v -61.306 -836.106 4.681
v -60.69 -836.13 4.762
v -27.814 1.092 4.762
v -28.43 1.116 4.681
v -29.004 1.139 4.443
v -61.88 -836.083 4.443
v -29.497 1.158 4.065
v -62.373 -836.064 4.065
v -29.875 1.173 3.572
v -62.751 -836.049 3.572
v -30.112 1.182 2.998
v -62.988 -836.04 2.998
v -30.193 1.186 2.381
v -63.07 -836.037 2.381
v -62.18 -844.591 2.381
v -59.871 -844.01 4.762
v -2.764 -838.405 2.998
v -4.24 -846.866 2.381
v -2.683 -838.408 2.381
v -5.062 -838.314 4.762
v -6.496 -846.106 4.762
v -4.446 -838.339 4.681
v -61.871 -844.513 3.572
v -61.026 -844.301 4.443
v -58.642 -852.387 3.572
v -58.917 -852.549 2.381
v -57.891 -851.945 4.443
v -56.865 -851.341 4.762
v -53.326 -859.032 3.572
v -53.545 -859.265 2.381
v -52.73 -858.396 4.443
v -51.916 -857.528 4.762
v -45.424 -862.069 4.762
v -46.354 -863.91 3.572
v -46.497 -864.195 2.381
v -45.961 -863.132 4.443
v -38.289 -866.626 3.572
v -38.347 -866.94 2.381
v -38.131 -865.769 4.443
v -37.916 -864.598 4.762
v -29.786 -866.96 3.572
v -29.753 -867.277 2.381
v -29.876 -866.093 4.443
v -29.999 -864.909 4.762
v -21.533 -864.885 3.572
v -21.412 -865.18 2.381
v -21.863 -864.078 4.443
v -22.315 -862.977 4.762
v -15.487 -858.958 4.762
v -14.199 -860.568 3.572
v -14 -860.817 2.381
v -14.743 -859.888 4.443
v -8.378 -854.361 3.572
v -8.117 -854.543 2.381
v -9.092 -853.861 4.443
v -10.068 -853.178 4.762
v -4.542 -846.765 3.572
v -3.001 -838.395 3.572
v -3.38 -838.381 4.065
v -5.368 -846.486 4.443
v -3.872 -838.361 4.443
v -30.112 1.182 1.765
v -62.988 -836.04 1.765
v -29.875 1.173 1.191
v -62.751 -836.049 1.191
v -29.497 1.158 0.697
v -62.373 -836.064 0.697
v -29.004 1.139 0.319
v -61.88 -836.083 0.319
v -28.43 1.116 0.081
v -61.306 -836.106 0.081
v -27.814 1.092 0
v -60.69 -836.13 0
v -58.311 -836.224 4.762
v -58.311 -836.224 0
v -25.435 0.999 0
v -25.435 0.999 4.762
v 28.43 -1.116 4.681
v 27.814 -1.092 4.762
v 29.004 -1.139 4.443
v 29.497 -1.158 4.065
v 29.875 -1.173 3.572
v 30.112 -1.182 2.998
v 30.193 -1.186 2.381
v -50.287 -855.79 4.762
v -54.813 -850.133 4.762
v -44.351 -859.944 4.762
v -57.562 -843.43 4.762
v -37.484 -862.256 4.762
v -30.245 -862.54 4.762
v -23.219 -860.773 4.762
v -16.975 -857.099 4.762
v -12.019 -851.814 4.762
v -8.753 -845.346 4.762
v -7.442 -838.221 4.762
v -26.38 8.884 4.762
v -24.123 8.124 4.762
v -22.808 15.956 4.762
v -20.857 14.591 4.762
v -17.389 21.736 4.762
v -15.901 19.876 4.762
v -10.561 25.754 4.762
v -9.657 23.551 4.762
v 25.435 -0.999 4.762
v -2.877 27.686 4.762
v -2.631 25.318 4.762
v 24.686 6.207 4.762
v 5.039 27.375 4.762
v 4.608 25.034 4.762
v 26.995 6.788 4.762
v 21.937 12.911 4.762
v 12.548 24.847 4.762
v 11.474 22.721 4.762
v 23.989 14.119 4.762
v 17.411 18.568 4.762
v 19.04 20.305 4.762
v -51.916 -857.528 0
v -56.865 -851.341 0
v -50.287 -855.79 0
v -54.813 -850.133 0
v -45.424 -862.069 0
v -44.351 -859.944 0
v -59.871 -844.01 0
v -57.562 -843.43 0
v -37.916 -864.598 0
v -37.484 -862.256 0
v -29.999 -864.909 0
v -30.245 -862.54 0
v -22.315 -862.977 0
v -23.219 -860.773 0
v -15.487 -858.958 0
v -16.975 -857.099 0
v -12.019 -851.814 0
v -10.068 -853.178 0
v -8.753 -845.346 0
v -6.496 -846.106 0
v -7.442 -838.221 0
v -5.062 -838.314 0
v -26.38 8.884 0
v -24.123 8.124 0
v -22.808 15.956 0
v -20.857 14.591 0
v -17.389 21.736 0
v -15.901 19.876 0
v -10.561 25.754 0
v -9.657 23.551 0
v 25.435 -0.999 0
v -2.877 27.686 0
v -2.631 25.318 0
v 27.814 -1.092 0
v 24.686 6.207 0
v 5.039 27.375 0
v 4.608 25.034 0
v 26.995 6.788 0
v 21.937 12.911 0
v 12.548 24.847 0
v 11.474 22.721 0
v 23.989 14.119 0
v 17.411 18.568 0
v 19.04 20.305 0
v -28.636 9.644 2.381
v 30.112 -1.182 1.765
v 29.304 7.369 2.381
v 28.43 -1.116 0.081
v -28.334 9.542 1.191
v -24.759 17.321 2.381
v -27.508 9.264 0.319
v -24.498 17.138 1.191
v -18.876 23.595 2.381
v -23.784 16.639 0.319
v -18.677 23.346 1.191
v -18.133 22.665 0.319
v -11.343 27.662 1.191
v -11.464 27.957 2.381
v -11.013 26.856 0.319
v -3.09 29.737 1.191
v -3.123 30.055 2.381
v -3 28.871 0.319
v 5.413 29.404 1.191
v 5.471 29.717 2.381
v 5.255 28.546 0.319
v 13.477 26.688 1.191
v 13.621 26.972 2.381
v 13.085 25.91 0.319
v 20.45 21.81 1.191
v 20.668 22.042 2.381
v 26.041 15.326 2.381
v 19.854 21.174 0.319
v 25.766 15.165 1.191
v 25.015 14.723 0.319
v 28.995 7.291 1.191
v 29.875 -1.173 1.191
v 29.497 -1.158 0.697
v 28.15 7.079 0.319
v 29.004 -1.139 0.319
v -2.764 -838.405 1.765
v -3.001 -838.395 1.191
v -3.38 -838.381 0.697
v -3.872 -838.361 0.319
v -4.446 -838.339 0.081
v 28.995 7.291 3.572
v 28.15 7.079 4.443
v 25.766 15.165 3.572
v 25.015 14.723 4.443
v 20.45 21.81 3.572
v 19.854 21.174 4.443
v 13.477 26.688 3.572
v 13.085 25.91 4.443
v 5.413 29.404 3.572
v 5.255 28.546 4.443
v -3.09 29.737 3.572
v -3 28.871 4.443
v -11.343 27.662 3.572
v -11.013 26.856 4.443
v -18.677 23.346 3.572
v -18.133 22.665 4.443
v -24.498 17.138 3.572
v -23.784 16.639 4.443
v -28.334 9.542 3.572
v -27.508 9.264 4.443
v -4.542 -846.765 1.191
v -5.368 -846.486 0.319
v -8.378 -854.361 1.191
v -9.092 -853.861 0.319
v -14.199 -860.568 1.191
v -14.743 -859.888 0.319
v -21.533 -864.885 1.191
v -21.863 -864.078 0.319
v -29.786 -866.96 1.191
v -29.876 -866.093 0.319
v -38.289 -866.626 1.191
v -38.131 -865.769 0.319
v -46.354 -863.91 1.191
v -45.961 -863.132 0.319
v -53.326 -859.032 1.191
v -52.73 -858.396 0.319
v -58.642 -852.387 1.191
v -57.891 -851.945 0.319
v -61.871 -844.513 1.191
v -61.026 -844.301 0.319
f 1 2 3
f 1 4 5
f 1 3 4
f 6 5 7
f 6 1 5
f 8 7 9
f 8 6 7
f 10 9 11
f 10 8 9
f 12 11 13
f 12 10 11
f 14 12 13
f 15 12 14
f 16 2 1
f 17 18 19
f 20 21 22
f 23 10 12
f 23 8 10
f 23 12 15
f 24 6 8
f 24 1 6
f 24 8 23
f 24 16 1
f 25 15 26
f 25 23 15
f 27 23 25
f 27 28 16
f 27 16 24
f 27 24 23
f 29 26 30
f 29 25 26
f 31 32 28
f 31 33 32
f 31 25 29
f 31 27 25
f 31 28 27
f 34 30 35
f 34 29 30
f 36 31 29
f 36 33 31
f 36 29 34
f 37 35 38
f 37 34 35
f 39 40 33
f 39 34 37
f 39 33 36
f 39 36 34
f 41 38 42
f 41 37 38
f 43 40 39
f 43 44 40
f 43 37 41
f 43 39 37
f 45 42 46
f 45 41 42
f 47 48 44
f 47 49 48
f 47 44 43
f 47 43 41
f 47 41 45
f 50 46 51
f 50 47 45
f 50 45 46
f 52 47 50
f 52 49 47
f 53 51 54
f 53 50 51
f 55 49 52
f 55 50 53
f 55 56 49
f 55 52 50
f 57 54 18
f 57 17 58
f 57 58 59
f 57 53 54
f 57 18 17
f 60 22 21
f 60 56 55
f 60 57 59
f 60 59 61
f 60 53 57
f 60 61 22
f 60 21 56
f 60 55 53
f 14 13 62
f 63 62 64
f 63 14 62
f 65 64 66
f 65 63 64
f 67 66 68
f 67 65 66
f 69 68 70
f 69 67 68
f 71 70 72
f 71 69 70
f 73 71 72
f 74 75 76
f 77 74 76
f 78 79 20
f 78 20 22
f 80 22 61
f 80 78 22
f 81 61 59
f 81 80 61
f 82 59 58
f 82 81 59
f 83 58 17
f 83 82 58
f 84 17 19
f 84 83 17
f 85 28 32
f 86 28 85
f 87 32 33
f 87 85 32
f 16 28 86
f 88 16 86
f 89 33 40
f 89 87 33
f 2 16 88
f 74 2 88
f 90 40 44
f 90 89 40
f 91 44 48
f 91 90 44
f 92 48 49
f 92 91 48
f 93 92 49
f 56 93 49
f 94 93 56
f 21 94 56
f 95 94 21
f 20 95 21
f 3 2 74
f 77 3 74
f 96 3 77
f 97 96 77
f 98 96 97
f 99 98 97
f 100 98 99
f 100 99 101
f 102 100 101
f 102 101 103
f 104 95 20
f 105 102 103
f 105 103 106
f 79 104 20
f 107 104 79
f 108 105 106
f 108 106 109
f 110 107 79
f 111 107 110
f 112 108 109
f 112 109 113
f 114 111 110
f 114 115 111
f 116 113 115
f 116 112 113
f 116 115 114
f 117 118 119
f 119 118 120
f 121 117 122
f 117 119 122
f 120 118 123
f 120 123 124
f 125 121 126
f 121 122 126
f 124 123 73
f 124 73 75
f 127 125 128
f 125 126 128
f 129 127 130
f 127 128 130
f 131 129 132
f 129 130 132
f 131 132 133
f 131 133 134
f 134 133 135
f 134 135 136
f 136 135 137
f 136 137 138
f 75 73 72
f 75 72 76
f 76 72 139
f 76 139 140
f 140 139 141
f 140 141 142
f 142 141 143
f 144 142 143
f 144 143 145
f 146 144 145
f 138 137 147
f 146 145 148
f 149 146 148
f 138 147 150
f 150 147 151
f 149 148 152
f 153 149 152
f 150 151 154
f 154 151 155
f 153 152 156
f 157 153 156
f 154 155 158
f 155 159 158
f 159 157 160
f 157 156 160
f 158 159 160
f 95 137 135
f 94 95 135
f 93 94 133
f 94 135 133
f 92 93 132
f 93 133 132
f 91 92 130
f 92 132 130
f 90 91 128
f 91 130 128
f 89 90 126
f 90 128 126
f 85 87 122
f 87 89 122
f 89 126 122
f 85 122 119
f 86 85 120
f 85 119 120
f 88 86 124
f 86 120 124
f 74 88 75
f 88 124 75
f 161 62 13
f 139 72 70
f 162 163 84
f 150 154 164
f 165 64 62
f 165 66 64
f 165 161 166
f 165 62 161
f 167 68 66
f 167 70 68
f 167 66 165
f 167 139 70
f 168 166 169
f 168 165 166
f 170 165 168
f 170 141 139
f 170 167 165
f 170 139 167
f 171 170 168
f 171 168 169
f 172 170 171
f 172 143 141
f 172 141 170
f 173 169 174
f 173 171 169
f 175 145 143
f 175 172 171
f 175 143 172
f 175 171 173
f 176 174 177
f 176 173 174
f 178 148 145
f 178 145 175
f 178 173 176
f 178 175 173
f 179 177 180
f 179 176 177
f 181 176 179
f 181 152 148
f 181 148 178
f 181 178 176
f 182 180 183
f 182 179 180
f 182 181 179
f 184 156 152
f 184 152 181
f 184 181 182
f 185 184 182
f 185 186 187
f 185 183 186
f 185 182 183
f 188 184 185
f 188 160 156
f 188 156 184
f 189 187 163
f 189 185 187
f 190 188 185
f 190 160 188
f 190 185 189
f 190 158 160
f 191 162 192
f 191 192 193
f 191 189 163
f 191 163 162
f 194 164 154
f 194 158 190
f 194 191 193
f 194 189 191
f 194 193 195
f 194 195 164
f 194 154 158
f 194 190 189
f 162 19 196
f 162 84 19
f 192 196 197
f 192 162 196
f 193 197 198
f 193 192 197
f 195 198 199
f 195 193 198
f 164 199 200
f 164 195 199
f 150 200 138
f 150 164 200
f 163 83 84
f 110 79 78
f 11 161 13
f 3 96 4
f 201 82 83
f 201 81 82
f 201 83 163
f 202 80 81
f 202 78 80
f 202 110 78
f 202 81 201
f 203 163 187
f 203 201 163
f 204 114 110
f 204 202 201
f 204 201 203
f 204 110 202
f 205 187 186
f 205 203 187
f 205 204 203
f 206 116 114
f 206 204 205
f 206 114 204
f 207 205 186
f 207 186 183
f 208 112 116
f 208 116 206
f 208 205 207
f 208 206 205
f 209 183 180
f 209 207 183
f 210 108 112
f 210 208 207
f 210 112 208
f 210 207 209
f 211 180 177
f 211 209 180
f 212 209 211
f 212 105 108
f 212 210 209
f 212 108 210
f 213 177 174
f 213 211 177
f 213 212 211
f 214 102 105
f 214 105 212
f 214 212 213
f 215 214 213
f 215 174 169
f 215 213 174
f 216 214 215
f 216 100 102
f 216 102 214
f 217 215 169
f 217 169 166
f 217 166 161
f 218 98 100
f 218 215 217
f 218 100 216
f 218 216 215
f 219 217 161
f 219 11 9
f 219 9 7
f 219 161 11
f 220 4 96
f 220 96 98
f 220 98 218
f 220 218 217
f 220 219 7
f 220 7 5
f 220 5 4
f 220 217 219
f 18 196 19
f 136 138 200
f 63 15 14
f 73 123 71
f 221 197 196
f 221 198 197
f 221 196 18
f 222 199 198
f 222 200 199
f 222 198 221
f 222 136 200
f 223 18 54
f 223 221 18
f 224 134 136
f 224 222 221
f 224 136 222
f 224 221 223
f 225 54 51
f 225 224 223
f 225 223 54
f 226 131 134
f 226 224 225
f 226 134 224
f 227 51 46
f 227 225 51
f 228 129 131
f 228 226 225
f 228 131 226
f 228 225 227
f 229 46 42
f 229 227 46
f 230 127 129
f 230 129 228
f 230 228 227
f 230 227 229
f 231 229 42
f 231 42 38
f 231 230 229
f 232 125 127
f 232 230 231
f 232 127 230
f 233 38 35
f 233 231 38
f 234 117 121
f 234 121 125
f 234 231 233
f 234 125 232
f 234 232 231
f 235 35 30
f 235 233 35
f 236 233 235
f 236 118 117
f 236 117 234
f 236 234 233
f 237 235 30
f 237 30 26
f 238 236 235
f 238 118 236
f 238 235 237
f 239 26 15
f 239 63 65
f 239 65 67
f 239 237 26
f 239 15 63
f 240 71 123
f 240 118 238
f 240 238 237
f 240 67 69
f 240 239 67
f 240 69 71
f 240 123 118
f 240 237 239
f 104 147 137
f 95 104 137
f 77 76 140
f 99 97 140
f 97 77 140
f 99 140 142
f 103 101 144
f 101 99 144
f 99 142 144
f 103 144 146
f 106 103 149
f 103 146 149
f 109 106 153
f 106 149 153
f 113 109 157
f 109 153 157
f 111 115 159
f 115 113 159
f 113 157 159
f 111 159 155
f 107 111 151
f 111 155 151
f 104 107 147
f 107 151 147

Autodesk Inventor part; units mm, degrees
ref_plane "YZ Plane" through (0, 0, 0) normal (1, 0, 0) x (0, 1, 0)
ref_plane "XZ Plane" through (0, 0, 0) normal (0, 1, 0) x (-1, 0, 0)
ref_plane "XY Plane" through (0, 0, 0) normal (0, 0, 1) x (1, 0, 0)
sketch "Sketch1" plane through (0, 0, 0) normal (0, 0, 1) x (1, 0, 0)
  arc A0 (25.4346, -0.9988) -> (-25.4346, 0.9988) centre (0, 0) ccw
  arc A1 (-58.3107, -836.2235) -> (-7.4415, -838.2211) centre (-32.8761, -837.2223) ccw
  arc A2 (-63.0695, -836.0367) -> (-2.6827, -838.4079) centre (-32.8761, -837.2223) ccw
  arc A3 (30.1934, -1.1856) -> (-30.1934, 1.1856) centre (0, 0) ccw
  line L0 (-30.1934, 1.1856) -> (-63.0695, -836.0367)
  line L1 (-58.3107, -836.2235) -> (-25.4346, 0.9988)
  line L2 (25.4346, -0.9988) -> (-7.4415, -838.2211)
  line L3 (-2.6827, -838.4079) -> (30.1934, -1.1856)
  dimension "d0" = 4.7625
extrude "Extrusion1" add sketch "Sketch1" along normal blind 4.7625
fillet "Fillet1" radius 2.3813 8 edges at (-34.0618, -867.4157, 4.7625) (-46.6315, -417.4255, 4.7625) (1.1856, 30.1934, 4.7625) (13.7554, -419.7968, 4.7625) (1.1856, 30.1934, 0) (-46.6315, -417.4255, 0) (-34.0618, -867.4157, 0) (13.7554, -419.7968, 0)
properties part number "Belt_Vertical_Long2"
